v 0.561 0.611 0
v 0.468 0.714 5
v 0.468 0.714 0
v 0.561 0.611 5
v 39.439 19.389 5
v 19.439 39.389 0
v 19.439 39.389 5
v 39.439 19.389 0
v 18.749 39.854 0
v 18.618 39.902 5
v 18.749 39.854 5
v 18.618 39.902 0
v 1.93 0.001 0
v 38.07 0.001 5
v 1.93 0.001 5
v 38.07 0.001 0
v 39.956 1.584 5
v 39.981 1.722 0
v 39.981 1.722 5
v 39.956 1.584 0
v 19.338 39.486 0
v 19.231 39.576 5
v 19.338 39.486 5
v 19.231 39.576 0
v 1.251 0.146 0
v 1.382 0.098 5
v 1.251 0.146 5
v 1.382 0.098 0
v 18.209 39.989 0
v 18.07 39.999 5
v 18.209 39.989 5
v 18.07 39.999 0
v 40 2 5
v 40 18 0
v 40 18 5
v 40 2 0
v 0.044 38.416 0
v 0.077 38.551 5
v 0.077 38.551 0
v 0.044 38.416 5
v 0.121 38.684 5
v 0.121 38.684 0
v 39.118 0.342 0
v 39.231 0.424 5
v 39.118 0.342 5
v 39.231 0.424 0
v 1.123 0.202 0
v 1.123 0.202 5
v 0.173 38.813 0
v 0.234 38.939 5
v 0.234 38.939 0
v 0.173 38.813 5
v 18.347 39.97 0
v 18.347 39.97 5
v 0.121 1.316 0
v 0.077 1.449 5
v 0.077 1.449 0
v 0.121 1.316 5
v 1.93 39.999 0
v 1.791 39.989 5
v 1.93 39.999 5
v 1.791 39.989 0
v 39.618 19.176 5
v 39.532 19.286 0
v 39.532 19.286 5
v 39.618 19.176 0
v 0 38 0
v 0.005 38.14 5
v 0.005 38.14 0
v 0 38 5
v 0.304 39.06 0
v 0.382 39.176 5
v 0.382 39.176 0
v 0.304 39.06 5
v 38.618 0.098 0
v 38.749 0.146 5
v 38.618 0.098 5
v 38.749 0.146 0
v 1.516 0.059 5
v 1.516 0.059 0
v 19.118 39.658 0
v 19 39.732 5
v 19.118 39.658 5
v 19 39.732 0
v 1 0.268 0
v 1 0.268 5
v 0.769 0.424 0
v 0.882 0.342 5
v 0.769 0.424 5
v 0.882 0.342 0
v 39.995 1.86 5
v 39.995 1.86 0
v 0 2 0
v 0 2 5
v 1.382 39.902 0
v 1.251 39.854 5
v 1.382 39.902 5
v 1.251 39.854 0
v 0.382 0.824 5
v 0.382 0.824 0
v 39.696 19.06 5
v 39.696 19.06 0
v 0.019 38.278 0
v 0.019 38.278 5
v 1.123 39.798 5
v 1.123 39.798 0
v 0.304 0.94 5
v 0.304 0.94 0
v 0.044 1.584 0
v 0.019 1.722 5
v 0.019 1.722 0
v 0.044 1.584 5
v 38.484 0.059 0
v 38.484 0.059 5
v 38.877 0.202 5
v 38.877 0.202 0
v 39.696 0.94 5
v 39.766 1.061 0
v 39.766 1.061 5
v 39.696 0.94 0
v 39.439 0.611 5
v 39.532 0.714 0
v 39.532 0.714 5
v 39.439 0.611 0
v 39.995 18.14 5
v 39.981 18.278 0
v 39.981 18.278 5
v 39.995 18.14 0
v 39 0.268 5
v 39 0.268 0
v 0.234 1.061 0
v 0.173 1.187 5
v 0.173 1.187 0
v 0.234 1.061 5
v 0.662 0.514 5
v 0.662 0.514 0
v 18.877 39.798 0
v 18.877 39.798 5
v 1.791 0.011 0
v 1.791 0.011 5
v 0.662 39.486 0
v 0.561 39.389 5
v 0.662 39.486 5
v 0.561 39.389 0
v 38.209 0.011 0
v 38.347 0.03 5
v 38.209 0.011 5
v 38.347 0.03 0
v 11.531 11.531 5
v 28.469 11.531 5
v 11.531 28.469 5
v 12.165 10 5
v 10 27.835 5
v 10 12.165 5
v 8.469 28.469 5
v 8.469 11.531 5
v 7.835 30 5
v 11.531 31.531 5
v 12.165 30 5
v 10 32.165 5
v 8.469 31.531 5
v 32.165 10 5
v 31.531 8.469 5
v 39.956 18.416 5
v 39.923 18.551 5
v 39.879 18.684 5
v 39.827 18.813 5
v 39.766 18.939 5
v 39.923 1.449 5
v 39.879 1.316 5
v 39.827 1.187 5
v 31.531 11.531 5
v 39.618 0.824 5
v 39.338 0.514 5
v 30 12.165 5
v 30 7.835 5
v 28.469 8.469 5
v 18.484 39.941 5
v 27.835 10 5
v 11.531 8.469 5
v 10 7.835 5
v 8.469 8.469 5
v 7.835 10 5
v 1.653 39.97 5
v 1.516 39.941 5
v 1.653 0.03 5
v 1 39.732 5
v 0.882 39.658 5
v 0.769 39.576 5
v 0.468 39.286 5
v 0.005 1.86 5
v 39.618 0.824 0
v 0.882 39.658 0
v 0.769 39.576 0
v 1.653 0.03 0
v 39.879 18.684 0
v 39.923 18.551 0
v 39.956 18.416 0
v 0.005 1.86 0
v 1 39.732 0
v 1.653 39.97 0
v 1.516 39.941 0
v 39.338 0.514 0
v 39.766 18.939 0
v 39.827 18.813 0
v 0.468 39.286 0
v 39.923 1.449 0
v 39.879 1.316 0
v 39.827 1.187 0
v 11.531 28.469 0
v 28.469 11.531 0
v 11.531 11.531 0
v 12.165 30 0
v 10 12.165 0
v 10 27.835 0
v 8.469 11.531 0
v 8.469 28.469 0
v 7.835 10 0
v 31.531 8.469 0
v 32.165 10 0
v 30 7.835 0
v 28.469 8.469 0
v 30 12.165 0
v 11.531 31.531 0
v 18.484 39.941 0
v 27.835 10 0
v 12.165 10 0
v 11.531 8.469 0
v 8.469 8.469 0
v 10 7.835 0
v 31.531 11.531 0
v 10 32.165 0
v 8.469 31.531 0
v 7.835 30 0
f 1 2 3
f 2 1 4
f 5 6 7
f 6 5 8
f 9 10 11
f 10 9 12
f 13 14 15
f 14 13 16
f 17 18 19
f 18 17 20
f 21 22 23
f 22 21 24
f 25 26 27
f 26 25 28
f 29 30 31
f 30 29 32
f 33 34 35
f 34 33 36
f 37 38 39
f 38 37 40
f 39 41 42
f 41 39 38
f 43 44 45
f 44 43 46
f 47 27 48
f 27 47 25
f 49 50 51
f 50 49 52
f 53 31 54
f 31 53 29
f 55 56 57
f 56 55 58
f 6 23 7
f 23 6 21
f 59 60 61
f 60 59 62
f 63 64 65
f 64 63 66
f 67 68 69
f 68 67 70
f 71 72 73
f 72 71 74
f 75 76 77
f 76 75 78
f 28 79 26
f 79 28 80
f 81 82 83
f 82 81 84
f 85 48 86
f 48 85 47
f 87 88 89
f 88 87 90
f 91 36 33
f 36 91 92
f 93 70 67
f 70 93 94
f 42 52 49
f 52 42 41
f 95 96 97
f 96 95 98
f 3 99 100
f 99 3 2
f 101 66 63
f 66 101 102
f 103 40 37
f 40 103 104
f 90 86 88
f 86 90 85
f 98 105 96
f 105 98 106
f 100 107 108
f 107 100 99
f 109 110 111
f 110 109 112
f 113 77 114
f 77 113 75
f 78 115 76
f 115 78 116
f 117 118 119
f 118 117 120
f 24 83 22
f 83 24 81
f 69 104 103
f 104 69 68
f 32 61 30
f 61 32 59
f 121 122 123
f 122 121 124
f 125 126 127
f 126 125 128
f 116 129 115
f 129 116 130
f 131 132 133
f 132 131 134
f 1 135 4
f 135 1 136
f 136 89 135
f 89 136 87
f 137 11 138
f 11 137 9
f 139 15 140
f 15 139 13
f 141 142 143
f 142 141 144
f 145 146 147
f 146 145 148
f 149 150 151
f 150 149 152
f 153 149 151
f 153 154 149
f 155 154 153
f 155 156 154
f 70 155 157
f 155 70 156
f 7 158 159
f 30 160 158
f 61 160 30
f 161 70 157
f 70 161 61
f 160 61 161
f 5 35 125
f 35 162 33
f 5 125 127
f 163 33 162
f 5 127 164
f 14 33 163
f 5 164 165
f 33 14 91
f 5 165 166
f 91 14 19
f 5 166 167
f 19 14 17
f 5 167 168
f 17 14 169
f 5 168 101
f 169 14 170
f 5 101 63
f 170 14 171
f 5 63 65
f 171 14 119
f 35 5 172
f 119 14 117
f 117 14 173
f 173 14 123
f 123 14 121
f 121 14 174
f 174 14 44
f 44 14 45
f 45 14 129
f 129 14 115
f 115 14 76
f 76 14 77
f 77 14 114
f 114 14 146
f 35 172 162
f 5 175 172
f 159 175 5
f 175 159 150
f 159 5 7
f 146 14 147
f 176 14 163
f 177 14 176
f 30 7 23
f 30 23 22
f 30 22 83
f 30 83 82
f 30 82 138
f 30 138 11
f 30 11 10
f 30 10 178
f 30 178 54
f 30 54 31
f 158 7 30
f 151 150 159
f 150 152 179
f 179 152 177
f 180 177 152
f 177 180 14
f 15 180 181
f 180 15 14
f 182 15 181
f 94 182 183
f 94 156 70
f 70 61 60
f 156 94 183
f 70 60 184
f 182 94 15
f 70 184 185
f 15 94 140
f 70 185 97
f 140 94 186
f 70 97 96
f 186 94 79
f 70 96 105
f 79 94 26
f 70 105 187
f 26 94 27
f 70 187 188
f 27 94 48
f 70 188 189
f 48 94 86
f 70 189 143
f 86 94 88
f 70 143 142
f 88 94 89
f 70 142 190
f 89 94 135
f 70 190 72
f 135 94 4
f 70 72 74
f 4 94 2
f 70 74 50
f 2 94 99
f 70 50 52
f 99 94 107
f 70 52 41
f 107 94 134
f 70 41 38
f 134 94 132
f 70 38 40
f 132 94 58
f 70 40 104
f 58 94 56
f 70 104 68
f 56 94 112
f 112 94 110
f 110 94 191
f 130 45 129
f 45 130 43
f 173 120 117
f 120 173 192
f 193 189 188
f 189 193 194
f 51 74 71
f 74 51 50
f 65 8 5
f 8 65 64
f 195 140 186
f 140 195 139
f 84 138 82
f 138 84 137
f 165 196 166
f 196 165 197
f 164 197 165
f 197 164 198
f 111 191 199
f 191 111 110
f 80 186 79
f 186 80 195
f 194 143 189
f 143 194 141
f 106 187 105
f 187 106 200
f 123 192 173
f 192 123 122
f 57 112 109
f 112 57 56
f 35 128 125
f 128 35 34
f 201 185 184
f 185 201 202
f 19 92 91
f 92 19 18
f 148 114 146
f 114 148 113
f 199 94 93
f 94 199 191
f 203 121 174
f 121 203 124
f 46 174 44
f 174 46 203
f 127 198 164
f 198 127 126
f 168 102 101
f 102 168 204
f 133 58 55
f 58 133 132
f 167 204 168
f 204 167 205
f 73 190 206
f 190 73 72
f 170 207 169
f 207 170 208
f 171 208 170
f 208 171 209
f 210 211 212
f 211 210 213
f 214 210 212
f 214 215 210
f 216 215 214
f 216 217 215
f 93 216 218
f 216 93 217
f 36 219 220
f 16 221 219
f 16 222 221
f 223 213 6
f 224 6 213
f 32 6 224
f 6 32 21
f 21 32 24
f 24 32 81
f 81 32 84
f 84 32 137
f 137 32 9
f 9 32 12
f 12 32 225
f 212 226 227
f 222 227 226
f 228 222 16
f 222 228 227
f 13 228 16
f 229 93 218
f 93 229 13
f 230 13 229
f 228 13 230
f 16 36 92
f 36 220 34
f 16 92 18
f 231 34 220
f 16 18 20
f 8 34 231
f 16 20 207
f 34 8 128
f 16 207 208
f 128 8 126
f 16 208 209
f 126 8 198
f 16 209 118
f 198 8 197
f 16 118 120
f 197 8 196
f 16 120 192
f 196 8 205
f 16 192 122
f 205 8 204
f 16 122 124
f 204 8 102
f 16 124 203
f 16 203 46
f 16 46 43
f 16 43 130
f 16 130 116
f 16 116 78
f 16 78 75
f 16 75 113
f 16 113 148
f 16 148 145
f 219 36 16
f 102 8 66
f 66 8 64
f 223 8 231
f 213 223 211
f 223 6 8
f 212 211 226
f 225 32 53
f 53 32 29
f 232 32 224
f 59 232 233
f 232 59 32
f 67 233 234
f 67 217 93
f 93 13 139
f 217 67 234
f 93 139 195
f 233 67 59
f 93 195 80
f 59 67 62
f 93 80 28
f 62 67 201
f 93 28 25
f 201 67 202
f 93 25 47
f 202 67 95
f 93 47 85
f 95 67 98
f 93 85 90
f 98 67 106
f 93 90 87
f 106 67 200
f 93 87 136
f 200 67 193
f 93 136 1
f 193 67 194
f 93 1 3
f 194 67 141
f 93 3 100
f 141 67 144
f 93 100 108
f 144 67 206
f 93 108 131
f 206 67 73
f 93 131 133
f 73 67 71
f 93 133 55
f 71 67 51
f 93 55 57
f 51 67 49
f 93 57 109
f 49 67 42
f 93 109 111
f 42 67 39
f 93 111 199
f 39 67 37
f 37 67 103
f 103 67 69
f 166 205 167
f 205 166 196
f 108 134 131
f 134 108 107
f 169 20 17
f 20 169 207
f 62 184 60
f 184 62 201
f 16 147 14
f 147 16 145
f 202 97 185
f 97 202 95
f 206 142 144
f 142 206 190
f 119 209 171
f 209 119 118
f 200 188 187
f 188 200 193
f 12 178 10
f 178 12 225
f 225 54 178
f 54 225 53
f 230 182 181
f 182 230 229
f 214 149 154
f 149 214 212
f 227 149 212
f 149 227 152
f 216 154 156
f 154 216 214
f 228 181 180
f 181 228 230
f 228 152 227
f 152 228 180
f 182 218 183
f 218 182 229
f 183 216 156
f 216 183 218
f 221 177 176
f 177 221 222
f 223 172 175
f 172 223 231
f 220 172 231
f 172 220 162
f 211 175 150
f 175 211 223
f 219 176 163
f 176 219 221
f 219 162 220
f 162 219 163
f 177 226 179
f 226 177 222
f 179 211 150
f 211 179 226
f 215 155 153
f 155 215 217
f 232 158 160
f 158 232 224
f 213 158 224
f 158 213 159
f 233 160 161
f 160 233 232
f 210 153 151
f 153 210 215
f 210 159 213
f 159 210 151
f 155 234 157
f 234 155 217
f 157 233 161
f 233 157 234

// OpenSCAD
// file: polyhole.scad
// The Cylinder is dead! Long live the Cylinder!
// A module for a polyhole by radius, based on Nophead's work.

module polyhole(h, r, cent = false)
{
    n = max(round(4 * r), 3);
    cylinder(h = h, r = r / cos(180 / n), $fn = n, center = cent);
}
// main file
use<polyhole.scad>

InnerBrace();

module InnerBrace()
{
    difference()
    {
        union()
        {
            hull()
            {
                translate([2, 2, 0])
                    cylinder(h = 5, r = 2, $fn = 90);
                translate([2, 40-2, 0])
                    cylinder(h = 5, r = 2, $fn = 90);
                translate([40-2, 20-2, 0])
                    cylinder(h = 5, r = 2, $fn = 90);
                translate([20-2, 40-2, 0])
                    cylinder(h = 5, r = 2, $fn = 90);
                translate([40-2, 2, 0])
                    cylinder(h = 5, r = 2, $fn = 90);
            }
        }
        translate([10, 10])
            polyhole(5, 2);
        translate([40-10, 10])
            polyhole(5, 2);
        translate([10, 40-10])
            polyhole(5, 2);
    }
}
